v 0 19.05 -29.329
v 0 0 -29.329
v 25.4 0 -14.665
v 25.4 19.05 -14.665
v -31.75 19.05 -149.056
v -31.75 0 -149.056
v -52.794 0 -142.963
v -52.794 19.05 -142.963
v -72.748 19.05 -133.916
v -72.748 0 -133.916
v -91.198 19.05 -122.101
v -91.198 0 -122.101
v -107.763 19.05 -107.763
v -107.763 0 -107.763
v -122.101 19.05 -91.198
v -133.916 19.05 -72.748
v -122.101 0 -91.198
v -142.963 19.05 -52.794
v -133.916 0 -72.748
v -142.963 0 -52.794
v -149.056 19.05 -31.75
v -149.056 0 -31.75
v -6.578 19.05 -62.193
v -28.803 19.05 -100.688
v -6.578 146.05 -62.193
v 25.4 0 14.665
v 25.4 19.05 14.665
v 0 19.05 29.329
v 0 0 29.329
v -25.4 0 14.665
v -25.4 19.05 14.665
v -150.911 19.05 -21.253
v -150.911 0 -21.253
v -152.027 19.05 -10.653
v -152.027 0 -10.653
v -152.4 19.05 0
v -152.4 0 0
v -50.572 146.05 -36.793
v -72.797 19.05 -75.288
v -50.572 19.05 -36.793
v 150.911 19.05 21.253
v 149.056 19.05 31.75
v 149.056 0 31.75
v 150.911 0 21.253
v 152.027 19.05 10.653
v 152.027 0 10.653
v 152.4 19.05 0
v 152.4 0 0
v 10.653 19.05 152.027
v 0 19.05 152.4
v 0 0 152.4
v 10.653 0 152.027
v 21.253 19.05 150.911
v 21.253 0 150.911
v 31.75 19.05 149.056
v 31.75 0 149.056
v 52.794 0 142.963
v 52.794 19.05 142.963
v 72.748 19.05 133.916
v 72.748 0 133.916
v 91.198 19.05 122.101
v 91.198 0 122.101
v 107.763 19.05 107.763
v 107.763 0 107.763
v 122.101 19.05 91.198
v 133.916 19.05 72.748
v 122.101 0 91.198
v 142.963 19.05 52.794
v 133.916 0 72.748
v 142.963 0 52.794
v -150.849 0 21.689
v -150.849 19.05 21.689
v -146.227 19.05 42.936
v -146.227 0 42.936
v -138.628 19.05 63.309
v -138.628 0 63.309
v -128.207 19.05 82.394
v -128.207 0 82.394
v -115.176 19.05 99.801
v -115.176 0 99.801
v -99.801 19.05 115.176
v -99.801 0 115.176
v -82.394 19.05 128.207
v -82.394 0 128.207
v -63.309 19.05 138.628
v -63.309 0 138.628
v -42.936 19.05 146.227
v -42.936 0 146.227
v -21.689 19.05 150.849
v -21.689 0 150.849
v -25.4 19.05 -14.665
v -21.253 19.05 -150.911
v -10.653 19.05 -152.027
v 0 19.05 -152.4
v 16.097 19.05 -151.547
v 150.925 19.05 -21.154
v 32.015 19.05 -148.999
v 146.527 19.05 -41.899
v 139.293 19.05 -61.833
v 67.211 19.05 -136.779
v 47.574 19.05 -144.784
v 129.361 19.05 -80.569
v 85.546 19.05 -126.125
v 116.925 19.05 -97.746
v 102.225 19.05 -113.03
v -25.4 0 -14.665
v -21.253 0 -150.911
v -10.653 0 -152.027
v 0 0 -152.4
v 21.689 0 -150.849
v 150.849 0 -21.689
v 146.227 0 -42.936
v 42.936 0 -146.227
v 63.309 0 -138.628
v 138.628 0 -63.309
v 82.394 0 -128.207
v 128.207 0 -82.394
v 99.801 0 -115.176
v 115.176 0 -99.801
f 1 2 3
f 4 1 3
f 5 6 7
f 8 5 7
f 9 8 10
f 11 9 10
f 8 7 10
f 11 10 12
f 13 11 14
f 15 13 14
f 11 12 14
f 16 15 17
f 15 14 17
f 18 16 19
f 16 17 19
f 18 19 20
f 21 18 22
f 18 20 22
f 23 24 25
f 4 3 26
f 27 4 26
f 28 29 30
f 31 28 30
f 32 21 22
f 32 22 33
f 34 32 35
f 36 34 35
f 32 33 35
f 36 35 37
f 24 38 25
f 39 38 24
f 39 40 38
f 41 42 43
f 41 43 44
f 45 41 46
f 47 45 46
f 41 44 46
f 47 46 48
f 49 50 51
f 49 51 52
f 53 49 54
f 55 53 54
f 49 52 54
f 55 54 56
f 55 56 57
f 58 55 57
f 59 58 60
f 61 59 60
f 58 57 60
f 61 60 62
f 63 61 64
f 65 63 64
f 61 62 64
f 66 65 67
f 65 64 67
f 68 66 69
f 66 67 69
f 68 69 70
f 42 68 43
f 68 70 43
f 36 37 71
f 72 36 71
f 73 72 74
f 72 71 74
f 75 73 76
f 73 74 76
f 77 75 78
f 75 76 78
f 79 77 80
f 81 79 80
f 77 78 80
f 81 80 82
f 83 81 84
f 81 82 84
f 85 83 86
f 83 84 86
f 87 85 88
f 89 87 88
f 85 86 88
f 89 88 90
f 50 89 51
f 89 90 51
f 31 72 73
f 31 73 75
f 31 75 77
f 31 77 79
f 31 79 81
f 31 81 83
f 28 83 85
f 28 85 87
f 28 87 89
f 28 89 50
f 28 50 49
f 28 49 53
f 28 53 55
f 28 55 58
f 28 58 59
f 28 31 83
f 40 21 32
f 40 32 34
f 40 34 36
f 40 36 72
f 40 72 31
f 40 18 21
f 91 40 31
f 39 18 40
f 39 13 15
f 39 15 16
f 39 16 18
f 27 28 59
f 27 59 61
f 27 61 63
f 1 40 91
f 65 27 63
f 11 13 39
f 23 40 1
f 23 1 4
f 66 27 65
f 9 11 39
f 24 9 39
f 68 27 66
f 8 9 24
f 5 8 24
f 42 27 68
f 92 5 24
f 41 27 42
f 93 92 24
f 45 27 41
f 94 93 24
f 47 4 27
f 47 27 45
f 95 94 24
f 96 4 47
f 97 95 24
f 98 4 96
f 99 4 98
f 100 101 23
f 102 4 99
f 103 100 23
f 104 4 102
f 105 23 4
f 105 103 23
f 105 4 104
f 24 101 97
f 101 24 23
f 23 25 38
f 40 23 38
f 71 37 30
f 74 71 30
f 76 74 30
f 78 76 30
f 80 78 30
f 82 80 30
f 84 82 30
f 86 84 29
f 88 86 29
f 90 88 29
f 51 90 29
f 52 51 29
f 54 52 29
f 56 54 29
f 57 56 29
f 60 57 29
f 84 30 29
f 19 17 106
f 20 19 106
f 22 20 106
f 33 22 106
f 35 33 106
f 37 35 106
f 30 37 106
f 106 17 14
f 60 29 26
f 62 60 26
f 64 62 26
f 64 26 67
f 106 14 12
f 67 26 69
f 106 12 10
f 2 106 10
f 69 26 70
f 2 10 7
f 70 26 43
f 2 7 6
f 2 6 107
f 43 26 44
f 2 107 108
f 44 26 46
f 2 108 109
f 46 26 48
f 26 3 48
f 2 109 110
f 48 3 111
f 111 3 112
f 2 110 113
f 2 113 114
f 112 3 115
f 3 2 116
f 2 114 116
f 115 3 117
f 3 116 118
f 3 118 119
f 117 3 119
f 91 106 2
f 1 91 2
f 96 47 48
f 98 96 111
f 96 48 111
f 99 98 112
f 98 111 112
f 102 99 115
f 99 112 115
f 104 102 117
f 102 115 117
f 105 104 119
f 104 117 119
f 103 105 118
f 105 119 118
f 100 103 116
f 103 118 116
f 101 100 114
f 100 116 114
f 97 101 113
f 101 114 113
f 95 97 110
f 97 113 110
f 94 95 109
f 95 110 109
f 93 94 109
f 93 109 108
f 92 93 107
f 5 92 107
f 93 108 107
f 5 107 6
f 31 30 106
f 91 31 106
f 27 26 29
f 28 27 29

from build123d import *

# Parameters (mm, degrees)
BOSS_EXTRUDE1_DEPTH = 19.05
BOSS_EXTRUDE2_DEPTH = 127
CUT_EXTRUDE1_DEPTH  = 282.074619797


with BuildPart() as part:
    # Sketch2 → Boss-Extrude1 (new body)
    # profile 1 of 5: a face of its own
    with BuildSketch(Plane(origin=(0, 0, 0), x_dir=(1, 0, 0), z_dir=(0, 1, 0))):
        with BuildLine():
            ThreePointArc((-149.056021348, 31.75), (-151.561699735, 15.962805935), (-152.4, 0))
            Line((-152.4, 0), (-139.7, 0))
            Line((-139.7, 0), (-139.7, 31.75))
            Line((-139.7, 31.75), (-149.056021348, 31.75))
        make_face()
    # profile 2 of 5: a face of its own
    with BuildSketch(Plane(origin=(0, 0, 0), x_dir=(1, 0, 0), z_dir=(0, 1, 0))):
        with BuildLine():
            ThreePointArc((0, 152.4), (-15.962805935, 151.561699735), (-31.75, 149.056021348))
            Line((-31.75, 149.056021348), (-31.75, 139.7))
            Line((-31.75, 139.7), (0, 139.7))
            Line((0, 139.7), (0, 152.4))
        make_face()
    # profile 3 of 5: a face of its own
    with BuildSketch(Plane(origin=(0, 0, 0), x_dir=(1, 0, 0), z_dir=(0, 1, 0))):
        with BuildLine():
            Line((139.7, -31.75), (149.056021348, -31.75))
            ThreePointArc((149.056021348, -31.75), (151.561699735, -15.962805935), (152.4, 0))
            Line((152.4, 0), (139.7, 0))
            Line((139.7, 0), (139.7, -31.75))
        make_face()
    # profile 4 of 5: a face of its own
    with BuildSketch(Plane(origin=(0, 0, 0), x_dir=(1, 0, 0), z_dir=(0, 1, 0))):
        with BuildLine():
            Line((0, -139.7), (0, -152.4))
            ThreePointArc((0, -152.4), (15.962805935, -151.561699735), (31.75, -149.056021348))
            Line((31.75, -149.056021348), (31.75, -139.7))
            Line((31.75, -139.7), (0, -139.7))
        make_face()
    # profile 5 of 5: a face of its own
    with BuildSketch(Plane(origin=(0, 0, 0), x_dir=(1, 0, 0), z_dir=(0, 1, 0))):
        with BuildLine():
            Line((-139.7, 0), (-152.4, 0))
            ThreePointArc((-152.4, 0), (-107.763073453, -107.763073453), (0, -152.4))
            Line((0, -152.4), (0, -139.7))
            Line((0, -139.7), (31.75, -139.7))
            Line((31.75, -139.7), (31.75, -149.056021348))
            ThreePointArc((31.75, -149.056021348), (107.763073453, -107.763073453), (149.056021348, -31.75))
            Line((149.056021348, -31.75), (139.7, -31.75))
            Line((139.7, -31.75), (139.7, 0))
            Line((139.7, 0), (152.4, 0))
            ThreePointArc((152.4, 0), (107.763073453, 107.763073453), (0, 152.4))
            Line((0, 152.4), (0, 139.7))
            Line((0, 139.7), (-31.75, 139.7))
            Line((-31.75, 139.7), (-31.75, 149.056021348))
            ThreePointArc((-31.75, 149.056021348), (-107.763073453, 107.763073453), (-149.056021348, 31.75))
            Line((-149.056021348, 31.75), (-139.7, 31.75))
            Line((-139.7, 31.75), (-139.7, 0))
        make_face()
        Polygon((-25.4, 14.664696837), (0, 29.329393675), (25.4, 14.664696837), (25.4, -14.664696837), (0, -29.329393675), (-25.4, -14.664696837), align=None, mode=Mode.SUBTRACT)
    extrude(amount=BOSS_EXTRUDE1_DEPTH)

    # Sketch3 → Boss-Extrude2 (add)
    with BuildSketch(Plane(origin=(0, 19.05, 0), x_dir=(1, 0, 0), z_dir=(0, 1, 0))):
        Polygon((-50.572045256, 36.793351826), (-72.797045256, 75.288181024), (-28.802954744, 100.688181024), (-6.577954744, 62.193351826), align=None)
    extrude(amount=BOSS_EXTRUDE2_DEPTH)

    # Sketch5 → Cut-Extrude1 (cut, through all)
    with BuildSketch(Plane(origin=(-21.997045256, 0, 12.7), x_dir=(0.5, 0, 0.8660254037844386), z_dir=(-0.8660254037844387, 0, 0.5000000000000001))):
        Polygon((-101.6, 19.05), (-101.6, 146.05), (-57.15, 146.05), align=None)
    extrude(amount=-CUT_EXTRUDE1_DEPTH, mode=Mode.SUBTRACT)


solid = part.part
